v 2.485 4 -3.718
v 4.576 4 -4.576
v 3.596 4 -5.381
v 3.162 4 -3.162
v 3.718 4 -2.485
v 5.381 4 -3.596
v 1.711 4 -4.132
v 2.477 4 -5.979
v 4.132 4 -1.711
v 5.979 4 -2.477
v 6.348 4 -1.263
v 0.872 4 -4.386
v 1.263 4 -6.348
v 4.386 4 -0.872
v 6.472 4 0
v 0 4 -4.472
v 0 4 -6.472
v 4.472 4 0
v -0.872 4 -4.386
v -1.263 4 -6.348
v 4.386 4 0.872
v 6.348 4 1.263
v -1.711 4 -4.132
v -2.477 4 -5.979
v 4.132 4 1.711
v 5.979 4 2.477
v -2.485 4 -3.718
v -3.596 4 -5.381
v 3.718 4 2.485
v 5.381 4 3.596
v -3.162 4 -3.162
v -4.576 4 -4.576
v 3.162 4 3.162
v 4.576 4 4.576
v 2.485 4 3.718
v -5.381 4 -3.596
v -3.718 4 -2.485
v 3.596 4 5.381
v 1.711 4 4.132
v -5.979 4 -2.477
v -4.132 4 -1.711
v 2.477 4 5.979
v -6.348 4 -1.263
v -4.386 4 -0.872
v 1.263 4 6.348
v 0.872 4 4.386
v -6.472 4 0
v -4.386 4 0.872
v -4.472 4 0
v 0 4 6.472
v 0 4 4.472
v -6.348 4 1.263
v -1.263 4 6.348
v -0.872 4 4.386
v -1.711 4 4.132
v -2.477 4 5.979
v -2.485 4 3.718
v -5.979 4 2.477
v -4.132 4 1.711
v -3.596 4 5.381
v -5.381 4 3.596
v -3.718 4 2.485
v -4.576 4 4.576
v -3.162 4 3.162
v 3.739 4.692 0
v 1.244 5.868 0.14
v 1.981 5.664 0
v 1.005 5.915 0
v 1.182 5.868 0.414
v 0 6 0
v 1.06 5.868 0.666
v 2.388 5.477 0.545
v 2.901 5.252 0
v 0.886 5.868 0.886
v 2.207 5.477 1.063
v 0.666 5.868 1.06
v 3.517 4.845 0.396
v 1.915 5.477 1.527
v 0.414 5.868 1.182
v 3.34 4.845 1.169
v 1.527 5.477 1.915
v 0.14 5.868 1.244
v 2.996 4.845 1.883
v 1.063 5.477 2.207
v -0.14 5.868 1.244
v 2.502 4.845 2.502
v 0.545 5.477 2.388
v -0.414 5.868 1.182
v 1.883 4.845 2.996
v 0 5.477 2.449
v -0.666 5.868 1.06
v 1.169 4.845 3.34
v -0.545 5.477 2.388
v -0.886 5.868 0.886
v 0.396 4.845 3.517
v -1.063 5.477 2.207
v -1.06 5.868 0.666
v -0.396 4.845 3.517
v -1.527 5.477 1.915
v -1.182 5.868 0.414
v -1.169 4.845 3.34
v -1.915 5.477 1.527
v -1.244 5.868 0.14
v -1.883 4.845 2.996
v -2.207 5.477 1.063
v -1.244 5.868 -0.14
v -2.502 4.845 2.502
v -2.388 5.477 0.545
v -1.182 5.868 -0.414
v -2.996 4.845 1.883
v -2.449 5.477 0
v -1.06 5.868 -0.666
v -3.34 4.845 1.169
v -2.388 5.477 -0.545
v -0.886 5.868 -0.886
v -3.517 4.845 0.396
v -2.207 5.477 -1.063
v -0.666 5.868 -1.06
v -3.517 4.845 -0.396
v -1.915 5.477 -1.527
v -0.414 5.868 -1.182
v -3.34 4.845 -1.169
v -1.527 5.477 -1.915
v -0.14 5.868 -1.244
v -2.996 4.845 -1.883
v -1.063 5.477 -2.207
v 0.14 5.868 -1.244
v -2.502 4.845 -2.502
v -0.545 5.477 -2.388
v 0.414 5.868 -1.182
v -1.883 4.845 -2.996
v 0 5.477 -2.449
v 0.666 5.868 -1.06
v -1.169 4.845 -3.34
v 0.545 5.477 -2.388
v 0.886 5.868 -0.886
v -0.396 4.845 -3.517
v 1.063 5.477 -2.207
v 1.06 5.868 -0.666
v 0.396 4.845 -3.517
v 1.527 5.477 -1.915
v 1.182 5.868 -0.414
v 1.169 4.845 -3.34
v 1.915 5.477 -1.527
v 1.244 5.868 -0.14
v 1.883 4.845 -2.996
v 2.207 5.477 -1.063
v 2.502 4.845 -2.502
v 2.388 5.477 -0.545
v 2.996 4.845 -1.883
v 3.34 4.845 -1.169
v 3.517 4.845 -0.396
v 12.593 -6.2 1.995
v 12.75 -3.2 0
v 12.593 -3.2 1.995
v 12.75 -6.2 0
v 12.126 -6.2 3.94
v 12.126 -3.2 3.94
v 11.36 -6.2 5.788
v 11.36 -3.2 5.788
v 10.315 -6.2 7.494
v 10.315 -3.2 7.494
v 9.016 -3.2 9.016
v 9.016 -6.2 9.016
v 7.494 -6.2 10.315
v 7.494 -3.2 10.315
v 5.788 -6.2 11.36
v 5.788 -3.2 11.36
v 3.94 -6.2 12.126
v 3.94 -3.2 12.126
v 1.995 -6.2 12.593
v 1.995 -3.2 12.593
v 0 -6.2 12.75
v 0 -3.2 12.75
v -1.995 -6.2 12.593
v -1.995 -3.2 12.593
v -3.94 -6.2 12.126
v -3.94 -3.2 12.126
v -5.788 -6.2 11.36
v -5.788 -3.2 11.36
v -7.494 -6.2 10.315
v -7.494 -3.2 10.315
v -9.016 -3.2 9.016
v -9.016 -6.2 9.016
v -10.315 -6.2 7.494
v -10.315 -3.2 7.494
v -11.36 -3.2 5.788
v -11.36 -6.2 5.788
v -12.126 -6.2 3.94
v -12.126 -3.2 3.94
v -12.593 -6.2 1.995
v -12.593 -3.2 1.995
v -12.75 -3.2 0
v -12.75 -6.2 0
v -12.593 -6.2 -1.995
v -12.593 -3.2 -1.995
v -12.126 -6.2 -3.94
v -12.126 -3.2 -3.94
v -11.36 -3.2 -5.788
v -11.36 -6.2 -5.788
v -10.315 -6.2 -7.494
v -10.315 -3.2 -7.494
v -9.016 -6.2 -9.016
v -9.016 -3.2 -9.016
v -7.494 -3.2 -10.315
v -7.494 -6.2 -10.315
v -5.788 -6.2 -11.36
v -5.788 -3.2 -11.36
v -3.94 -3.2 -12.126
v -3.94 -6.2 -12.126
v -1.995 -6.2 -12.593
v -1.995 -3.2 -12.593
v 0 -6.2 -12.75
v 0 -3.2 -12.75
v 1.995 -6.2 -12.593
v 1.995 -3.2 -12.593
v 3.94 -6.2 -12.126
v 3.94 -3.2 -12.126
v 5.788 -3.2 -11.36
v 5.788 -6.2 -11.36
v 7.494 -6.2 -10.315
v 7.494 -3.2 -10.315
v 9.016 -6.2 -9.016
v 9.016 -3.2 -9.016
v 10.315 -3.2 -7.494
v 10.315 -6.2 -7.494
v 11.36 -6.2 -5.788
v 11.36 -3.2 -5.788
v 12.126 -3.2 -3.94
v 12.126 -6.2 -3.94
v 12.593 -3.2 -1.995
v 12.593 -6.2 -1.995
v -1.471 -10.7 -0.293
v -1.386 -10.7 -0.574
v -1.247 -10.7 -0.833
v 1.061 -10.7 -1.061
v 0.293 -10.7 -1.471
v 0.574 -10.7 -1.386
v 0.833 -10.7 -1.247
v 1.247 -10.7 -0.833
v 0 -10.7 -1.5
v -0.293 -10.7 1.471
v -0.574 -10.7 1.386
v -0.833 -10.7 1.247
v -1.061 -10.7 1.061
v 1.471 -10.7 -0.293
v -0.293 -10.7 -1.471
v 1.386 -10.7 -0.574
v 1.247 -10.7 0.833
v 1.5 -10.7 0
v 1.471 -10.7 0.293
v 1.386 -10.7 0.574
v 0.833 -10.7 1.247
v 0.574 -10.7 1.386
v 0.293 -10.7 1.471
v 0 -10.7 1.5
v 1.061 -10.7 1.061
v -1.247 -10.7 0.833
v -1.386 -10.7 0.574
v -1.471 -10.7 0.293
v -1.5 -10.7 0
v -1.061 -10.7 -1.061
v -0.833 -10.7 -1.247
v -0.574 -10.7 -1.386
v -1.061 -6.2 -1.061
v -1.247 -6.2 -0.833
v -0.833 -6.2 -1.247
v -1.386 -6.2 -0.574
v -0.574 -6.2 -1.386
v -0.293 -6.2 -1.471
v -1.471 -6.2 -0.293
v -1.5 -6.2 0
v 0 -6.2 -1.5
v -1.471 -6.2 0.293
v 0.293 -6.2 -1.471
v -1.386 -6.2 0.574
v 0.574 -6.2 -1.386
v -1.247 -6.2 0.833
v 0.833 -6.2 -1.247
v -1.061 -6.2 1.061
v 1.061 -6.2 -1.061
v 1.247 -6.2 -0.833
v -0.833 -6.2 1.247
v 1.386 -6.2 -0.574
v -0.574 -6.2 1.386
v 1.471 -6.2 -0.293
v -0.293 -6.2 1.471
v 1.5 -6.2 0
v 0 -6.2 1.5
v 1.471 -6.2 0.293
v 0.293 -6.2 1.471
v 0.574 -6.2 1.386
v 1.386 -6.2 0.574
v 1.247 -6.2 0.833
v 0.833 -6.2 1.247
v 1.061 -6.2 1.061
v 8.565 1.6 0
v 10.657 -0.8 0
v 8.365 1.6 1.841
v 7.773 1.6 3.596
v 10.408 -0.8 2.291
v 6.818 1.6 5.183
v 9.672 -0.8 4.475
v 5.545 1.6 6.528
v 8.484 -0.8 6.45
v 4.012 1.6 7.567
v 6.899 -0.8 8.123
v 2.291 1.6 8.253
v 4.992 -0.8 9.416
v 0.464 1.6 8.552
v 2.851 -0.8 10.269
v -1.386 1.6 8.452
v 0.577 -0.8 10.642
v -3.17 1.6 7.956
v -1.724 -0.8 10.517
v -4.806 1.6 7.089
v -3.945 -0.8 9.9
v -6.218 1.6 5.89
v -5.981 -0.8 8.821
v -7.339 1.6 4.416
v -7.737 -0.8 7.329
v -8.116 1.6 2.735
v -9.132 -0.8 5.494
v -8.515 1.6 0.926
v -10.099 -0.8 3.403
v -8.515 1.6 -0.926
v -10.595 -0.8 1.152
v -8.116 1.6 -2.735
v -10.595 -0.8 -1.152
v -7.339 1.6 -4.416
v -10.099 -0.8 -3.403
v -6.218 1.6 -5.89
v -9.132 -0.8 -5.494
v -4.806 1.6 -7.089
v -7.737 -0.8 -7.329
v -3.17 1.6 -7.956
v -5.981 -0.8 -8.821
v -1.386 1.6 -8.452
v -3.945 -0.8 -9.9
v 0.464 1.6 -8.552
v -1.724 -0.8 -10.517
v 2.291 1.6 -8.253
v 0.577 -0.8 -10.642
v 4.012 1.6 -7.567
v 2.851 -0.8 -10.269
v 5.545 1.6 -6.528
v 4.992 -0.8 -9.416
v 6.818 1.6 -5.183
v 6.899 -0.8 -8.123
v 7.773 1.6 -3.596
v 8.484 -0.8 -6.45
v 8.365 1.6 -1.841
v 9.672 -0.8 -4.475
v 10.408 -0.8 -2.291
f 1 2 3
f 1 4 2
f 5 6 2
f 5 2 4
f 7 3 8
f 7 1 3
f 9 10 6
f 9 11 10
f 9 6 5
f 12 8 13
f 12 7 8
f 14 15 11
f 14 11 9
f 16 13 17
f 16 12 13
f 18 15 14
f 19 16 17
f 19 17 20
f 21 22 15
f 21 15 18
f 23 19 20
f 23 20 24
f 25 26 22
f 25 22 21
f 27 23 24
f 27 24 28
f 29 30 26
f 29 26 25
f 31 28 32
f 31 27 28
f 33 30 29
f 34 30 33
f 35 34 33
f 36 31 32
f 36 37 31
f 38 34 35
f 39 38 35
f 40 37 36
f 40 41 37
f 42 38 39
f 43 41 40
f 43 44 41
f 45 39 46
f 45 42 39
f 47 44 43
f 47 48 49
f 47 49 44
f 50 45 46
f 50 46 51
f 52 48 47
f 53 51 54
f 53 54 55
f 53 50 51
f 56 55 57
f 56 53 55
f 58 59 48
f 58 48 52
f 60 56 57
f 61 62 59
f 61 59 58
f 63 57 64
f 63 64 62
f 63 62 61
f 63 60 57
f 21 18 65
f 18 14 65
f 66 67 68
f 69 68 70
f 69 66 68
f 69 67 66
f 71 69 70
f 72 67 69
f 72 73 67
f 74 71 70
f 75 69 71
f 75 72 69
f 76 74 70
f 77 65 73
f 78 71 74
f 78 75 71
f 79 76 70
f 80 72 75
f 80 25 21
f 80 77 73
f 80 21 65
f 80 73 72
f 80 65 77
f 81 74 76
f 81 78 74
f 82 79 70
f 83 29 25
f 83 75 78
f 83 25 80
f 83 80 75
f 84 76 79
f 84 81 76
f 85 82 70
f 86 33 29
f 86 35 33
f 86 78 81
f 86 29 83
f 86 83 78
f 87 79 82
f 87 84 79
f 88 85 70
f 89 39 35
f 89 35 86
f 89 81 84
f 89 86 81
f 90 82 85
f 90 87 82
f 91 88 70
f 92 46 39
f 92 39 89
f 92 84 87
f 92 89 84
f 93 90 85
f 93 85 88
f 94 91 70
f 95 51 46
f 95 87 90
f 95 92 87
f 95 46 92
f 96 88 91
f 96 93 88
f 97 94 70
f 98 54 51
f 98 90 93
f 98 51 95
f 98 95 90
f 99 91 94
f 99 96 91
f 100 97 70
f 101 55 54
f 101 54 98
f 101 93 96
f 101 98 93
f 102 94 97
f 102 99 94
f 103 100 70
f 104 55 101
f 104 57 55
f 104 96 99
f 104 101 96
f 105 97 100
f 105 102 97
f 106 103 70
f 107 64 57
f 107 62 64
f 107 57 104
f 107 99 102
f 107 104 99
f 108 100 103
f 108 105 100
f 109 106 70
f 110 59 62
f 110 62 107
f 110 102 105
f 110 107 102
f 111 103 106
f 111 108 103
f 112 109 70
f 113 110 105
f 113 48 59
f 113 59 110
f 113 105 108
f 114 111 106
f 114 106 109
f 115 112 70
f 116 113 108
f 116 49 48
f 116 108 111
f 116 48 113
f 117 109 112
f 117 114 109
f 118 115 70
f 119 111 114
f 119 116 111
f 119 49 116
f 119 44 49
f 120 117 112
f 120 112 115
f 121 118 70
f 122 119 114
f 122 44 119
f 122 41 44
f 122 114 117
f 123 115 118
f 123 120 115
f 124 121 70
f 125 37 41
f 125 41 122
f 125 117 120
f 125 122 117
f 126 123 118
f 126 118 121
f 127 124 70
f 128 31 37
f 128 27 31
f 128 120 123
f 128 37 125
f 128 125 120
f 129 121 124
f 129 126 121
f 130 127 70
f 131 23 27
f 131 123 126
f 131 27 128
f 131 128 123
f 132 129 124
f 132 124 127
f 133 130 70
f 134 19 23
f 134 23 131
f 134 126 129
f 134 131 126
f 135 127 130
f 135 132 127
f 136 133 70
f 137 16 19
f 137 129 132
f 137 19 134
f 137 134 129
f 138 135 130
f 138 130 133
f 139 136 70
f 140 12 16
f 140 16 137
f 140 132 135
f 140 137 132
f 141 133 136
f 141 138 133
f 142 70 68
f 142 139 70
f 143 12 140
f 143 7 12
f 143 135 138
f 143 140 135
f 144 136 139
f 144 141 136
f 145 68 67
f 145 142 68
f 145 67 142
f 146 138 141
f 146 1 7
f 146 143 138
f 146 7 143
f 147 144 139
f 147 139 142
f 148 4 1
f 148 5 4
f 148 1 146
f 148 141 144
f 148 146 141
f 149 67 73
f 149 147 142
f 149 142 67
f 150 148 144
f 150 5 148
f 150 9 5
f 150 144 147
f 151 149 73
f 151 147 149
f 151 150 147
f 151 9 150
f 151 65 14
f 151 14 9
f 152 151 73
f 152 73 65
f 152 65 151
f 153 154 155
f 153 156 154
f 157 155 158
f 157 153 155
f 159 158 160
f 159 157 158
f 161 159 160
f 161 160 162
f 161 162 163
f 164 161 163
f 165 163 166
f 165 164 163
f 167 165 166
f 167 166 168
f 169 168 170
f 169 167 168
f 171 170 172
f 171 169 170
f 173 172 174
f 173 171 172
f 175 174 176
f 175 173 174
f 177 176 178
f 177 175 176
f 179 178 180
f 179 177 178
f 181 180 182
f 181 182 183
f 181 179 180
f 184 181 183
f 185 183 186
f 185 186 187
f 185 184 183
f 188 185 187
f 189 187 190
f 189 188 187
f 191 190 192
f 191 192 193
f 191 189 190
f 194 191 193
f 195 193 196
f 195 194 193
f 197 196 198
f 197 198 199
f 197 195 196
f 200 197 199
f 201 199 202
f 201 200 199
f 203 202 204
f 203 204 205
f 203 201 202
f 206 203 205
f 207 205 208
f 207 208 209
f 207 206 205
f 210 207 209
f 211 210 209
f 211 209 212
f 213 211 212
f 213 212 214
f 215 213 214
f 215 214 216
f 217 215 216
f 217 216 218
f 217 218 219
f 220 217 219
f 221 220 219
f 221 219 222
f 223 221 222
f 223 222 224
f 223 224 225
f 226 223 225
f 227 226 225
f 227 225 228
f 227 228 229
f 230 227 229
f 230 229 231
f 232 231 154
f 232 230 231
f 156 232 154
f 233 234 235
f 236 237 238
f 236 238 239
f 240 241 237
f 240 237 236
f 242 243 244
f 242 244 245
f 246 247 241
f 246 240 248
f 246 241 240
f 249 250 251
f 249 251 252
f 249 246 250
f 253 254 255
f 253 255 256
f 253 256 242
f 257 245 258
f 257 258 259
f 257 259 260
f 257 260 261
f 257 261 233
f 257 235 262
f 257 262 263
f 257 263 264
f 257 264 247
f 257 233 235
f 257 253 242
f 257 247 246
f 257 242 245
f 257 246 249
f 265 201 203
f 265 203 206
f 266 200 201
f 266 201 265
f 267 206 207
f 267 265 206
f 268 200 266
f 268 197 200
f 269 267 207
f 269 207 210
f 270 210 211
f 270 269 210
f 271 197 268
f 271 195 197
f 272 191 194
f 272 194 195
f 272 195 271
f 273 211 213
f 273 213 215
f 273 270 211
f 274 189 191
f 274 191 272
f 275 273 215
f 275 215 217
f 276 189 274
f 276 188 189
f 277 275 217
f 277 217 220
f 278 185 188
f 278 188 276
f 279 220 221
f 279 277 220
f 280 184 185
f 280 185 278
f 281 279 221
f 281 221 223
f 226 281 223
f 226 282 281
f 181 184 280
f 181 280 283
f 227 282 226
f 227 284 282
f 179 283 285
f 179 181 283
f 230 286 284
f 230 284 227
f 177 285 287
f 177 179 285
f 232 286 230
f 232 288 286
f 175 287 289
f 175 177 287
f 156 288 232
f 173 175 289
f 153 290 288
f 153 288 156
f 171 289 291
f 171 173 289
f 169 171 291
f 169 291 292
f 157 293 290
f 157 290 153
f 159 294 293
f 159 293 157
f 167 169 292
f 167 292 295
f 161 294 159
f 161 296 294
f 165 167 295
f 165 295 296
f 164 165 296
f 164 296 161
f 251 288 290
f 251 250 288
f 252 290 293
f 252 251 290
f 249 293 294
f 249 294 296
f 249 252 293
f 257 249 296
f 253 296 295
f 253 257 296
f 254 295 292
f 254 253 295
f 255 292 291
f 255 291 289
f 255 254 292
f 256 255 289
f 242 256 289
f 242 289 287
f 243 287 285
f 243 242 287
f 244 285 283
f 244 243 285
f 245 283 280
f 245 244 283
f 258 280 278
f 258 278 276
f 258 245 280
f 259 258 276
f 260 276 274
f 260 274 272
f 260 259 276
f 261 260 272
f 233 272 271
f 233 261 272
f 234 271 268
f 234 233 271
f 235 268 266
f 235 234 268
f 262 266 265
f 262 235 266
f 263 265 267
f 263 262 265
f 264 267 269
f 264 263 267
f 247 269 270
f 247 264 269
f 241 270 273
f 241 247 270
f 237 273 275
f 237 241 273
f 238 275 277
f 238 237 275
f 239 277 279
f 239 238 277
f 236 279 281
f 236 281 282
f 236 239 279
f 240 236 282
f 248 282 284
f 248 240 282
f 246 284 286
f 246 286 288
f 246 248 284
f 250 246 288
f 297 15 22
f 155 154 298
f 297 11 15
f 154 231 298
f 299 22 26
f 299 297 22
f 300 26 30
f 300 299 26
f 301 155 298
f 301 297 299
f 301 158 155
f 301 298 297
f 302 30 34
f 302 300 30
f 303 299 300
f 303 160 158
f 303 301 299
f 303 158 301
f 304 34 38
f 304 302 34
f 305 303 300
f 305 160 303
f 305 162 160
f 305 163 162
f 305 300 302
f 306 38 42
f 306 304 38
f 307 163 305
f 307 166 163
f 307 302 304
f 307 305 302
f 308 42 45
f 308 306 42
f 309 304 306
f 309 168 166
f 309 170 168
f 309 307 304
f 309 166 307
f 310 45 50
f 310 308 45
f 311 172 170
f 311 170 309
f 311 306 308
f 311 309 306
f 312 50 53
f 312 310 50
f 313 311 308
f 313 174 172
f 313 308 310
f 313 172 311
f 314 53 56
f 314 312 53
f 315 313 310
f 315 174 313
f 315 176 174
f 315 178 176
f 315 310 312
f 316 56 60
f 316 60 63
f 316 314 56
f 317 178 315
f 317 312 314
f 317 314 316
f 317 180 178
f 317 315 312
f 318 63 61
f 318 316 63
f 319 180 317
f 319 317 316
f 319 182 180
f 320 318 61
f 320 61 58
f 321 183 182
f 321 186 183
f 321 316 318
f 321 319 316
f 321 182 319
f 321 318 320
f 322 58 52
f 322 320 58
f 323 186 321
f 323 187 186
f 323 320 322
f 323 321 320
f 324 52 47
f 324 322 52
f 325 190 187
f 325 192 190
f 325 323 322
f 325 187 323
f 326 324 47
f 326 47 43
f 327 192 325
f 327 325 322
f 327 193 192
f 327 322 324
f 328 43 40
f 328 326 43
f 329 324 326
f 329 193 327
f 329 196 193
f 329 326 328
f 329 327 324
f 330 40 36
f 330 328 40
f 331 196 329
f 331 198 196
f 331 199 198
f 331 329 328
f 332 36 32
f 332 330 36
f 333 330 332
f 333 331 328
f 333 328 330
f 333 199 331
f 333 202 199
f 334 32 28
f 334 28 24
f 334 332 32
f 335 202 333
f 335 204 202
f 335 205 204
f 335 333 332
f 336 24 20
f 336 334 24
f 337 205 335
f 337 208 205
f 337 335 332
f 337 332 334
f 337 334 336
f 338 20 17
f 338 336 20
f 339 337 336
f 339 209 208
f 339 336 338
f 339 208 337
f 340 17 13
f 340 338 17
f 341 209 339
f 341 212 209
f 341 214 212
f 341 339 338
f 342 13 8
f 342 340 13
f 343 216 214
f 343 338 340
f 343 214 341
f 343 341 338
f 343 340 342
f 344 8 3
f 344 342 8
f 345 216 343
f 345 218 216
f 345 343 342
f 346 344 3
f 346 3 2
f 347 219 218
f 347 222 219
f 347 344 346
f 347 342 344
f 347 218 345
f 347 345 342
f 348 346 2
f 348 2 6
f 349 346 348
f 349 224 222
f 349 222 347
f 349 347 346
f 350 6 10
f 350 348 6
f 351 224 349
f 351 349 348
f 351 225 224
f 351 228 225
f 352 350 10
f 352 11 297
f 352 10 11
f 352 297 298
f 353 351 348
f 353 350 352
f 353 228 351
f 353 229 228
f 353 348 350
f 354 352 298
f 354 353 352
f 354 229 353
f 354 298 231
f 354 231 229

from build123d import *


with BuildPart() as part:
    # Esquisse1 → Révolution1 (revolve)
    with BuildSketch(Plane.XY):
        with BuildLine():
            Line((12.75, -3.2), (12.75, -6.2))
            Line((12.75, -6.2), (1.5, -6.2))
            Line((1.5, -6.2), (1.5, -10.7))
            Line((1.5, -10.7), (0, -10.7))
            Line((0, -10.7), (0, 6))
            ThreePointArc((0, 6), (2.449489743, 5.477225575), (4.472135955, 4))
            Line((4.472135955, 4), (6.472135955, 4))
            Line((6.472135955, 4), (12.75, -3.2))
        make_face()
    revolve(axis=Axis((0, 6, 0), (0, -1, 0)))


solid = part.part
